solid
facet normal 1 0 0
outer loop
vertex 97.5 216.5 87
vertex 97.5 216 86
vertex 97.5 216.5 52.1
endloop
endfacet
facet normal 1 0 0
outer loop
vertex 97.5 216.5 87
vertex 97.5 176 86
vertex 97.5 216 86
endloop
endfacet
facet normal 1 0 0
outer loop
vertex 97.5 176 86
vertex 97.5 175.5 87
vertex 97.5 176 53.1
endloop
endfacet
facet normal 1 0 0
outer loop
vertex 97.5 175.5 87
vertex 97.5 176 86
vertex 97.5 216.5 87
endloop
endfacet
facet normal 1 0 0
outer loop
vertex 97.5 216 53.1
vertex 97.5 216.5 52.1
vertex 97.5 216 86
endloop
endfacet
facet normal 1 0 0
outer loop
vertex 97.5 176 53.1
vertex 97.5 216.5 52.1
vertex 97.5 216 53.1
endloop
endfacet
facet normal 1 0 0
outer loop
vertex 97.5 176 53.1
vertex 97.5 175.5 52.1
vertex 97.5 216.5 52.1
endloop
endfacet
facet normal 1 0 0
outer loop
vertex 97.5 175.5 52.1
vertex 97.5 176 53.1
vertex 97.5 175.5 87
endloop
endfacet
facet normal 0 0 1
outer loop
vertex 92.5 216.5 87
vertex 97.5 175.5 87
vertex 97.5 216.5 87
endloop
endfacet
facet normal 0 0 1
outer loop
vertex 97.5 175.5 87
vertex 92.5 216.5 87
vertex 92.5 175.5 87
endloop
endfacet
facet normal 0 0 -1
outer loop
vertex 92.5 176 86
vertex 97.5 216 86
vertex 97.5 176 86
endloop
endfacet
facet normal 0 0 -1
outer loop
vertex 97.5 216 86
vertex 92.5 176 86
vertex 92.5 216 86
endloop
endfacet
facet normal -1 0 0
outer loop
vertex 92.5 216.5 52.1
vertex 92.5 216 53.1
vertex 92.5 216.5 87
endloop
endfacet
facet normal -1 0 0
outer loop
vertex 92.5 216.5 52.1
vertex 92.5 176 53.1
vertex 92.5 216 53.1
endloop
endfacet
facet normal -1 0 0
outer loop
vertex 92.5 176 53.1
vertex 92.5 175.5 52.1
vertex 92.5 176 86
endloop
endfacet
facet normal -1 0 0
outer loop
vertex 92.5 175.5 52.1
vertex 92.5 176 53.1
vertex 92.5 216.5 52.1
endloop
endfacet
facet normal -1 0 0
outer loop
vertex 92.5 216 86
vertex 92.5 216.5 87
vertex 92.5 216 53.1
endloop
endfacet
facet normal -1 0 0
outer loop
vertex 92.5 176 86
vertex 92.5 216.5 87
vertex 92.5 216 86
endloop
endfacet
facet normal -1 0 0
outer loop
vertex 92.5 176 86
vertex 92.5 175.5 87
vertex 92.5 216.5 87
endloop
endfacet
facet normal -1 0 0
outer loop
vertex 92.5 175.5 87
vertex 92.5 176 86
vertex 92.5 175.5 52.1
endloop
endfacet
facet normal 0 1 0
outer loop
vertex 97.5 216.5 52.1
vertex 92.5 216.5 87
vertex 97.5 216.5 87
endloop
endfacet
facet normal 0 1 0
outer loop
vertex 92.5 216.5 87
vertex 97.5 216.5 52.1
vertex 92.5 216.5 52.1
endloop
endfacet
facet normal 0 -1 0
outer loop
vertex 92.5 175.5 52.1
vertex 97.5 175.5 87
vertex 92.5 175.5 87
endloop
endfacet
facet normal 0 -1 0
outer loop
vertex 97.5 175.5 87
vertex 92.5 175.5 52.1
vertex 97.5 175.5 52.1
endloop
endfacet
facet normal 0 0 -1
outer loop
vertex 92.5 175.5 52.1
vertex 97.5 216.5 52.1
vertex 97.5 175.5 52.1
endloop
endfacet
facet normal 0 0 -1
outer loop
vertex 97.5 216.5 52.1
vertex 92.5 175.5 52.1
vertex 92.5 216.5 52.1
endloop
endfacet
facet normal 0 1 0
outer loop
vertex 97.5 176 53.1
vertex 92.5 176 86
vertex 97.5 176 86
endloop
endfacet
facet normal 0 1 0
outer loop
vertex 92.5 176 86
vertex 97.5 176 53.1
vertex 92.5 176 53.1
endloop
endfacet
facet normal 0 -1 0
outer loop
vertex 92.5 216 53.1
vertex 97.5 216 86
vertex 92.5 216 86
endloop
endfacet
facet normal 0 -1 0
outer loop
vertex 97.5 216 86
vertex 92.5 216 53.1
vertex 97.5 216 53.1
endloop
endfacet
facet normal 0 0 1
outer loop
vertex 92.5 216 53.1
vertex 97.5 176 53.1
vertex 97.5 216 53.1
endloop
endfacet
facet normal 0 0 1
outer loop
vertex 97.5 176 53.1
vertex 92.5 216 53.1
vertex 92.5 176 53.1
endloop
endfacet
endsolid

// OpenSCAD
// Generated from the same CSG operations as STEP. Rebuild with spec/build_parent_hand_service.py.
union(){union(){union(){translate([92.5,175.5,86]) cube([5,41,1]);translate([92.5,175.5,52.1]) cube([5,0.5,34.9]);}translate([92.5,216,52.1]) cube([5,0.5,34.9]);}translate([92.5,175.5,52.1]) cube([5,41,1]);}
